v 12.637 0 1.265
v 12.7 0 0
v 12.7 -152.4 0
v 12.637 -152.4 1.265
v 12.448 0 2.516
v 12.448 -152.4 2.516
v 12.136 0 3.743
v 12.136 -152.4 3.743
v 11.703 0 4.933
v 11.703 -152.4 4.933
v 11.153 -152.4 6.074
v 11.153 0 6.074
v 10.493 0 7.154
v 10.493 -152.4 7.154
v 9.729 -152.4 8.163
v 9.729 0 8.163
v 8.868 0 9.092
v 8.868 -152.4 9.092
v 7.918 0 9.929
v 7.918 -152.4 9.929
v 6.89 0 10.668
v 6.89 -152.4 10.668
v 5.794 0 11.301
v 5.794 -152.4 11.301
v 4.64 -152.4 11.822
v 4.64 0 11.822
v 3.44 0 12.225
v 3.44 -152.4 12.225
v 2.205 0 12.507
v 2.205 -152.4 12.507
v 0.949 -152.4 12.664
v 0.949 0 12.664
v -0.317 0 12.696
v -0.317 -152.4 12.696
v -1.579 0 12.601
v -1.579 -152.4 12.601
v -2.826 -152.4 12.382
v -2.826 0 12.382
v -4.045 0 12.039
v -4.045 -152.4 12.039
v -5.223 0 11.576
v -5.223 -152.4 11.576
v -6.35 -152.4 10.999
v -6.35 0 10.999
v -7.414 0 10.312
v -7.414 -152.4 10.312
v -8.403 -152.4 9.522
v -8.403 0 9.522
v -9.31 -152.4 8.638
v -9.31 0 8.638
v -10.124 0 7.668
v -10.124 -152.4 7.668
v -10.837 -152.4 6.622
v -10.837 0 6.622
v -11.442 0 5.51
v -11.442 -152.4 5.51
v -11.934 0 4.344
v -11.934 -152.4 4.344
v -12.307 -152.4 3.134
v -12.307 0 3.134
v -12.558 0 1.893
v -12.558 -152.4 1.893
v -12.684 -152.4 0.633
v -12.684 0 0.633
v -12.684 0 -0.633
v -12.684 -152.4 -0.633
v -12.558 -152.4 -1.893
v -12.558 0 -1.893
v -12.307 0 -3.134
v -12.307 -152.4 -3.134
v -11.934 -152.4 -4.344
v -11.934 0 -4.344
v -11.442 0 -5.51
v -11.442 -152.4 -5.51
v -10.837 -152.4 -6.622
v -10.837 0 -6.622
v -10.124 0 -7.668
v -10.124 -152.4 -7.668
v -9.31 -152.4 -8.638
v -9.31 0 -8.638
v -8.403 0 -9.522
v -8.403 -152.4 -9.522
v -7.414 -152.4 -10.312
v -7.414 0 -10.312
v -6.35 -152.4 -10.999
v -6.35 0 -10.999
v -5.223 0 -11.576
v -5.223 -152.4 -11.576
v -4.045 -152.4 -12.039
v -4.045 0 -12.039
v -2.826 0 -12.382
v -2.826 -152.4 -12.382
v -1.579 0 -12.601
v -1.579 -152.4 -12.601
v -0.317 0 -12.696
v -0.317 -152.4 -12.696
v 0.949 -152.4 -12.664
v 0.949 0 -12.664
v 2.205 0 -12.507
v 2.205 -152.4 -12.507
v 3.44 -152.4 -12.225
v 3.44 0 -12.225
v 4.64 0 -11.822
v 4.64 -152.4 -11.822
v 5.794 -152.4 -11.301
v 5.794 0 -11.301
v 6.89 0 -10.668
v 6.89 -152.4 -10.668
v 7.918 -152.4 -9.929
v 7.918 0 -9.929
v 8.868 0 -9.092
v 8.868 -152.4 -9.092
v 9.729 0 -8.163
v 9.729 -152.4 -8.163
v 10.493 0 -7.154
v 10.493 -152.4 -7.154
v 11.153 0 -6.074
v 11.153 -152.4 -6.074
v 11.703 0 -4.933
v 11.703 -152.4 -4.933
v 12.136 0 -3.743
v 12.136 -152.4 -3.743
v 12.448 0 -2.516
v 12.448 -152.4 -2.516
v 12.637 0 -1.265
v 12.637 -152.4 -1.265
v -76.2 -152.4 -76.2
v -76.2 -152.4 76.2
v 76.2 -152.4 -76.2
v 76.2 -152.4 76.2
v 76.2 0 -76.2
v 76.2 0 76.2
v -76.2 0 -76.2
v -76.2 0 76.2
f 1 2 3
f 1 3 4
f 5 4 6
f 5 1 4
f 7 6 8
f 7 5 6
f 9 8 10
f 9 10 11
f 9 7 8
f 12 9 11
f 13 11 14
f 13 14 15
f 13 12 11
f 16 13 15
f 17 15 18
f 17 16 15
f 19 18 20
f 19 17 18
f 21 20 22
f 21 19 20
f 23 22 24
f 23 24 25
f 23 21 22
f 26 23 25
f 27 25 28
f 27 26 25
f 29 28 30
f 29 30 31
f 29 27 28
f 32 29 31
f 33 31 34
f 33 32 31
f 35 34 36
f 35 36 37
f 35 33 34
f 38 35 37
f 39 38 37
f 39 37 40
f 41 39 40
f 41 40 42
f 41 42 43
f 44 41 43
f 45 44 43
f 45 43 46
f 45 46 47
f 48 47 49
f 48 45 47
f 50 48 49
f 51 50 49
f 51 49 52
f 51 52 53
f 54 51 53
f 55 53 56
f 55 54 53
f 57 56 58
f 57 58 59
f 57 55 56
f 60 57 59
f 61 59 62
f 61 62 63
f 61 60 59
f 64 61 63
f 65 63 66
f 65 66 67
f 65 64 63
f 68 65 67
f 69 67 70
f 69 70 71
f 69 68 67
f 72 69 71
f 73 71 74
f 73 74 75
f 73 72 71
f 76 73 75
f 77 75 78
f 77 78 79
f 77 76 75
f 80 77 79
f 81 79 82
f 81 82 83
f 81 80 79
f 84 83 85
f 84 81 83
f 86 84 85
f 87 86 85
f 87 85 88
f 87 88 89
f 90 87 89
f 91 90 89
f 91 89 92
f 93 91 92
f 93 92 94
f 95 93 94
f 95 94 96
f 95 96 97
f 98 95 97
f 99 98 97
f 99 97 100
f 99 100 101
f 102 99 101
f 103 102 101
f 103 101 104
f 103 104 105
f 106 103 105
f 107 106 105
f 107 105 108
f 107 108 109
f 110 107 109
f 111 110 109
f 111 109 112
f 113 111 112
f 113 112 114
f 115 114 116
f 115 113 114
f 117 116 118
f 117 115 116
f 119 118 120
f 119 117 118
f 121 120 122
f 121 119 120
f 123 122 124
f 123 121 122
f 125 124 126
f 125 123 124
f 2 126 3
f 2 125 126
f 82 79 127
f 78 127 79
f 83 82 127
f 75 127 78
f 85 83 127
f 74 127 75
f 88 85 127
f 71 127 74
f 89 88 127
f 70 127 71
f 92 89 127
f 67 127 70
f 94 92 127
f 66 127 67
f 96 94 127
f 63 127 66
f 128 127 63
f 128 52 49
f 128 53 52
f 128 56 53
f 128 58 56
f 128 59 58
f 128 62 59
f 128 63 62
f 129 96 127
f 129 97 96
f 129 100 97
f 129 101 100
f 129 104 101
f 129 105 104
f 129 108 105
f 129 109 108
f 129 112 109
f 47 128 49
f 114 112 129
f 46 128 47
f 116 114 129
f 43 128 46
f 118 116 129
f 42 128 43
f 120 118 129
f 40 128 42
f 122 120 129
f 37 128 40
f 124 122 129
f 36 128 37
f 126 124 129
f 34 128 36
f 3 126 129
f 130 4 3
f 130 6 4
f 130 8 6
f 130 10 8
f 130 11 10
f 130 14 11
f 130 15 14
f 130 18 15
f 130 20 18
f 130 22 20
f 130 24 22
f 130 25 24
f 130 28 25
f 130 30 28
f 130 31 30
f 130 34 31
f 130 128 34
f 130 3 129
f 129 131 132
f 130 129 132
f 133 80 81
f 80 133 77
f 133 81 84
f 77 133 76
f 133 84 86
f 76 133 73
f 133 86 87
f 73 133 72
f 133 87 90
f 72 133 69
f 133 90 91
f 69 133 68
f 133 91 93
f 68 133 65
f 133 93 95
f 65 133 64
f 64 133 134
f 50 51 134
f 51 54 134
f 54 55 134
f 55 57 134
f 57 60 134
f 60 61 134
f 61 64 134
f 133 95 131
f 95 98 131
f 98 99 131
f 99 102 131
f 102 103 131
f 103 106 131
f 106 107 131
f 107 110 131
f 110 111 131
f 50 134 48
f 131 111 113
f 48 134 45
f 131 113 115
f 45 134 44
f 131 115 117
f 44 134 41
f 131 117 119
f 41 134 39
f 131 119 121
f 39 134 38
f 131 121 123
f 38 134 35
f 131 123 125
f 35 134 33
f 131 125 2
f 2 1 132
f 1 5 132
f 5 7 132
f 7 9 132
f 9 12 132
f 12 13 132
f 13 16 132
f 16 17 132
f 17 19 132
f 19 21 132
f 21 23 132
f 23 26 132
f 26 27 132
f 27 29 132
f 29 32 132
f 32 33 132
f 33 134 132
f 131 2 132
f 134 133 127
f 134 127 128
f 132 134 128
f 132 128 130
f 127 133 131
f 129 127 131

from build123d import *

# Parameters (mm, degrees)
F0_W     = 152.4
F0_H     = 152.4
F0_R     = 12.7
F1_DEPTH = 152.4
F2_DEPTH = 152.4


with BuildPart() as f1:
    # F0 (on Front) → F1 (new body)
    with BuildSketch(Plane.XZ):
        Rectangle(F0_W, F0_H)
        Circle(F0_R, mode=Mode.SUBTRACT)
    extrude(amount=F1_DEPTH)

    # F0 (on Front) → F2 (cut)
    with BuildSketch(Plane.XZ):
        Rectangle(F0_W, F0_H)
        Circle(F0_R, mode=Mode.SUBTRACT)
    extrude(amount=-F2_DEPTH, mode=Mode.SUBTRACT)


solid = f1.part
